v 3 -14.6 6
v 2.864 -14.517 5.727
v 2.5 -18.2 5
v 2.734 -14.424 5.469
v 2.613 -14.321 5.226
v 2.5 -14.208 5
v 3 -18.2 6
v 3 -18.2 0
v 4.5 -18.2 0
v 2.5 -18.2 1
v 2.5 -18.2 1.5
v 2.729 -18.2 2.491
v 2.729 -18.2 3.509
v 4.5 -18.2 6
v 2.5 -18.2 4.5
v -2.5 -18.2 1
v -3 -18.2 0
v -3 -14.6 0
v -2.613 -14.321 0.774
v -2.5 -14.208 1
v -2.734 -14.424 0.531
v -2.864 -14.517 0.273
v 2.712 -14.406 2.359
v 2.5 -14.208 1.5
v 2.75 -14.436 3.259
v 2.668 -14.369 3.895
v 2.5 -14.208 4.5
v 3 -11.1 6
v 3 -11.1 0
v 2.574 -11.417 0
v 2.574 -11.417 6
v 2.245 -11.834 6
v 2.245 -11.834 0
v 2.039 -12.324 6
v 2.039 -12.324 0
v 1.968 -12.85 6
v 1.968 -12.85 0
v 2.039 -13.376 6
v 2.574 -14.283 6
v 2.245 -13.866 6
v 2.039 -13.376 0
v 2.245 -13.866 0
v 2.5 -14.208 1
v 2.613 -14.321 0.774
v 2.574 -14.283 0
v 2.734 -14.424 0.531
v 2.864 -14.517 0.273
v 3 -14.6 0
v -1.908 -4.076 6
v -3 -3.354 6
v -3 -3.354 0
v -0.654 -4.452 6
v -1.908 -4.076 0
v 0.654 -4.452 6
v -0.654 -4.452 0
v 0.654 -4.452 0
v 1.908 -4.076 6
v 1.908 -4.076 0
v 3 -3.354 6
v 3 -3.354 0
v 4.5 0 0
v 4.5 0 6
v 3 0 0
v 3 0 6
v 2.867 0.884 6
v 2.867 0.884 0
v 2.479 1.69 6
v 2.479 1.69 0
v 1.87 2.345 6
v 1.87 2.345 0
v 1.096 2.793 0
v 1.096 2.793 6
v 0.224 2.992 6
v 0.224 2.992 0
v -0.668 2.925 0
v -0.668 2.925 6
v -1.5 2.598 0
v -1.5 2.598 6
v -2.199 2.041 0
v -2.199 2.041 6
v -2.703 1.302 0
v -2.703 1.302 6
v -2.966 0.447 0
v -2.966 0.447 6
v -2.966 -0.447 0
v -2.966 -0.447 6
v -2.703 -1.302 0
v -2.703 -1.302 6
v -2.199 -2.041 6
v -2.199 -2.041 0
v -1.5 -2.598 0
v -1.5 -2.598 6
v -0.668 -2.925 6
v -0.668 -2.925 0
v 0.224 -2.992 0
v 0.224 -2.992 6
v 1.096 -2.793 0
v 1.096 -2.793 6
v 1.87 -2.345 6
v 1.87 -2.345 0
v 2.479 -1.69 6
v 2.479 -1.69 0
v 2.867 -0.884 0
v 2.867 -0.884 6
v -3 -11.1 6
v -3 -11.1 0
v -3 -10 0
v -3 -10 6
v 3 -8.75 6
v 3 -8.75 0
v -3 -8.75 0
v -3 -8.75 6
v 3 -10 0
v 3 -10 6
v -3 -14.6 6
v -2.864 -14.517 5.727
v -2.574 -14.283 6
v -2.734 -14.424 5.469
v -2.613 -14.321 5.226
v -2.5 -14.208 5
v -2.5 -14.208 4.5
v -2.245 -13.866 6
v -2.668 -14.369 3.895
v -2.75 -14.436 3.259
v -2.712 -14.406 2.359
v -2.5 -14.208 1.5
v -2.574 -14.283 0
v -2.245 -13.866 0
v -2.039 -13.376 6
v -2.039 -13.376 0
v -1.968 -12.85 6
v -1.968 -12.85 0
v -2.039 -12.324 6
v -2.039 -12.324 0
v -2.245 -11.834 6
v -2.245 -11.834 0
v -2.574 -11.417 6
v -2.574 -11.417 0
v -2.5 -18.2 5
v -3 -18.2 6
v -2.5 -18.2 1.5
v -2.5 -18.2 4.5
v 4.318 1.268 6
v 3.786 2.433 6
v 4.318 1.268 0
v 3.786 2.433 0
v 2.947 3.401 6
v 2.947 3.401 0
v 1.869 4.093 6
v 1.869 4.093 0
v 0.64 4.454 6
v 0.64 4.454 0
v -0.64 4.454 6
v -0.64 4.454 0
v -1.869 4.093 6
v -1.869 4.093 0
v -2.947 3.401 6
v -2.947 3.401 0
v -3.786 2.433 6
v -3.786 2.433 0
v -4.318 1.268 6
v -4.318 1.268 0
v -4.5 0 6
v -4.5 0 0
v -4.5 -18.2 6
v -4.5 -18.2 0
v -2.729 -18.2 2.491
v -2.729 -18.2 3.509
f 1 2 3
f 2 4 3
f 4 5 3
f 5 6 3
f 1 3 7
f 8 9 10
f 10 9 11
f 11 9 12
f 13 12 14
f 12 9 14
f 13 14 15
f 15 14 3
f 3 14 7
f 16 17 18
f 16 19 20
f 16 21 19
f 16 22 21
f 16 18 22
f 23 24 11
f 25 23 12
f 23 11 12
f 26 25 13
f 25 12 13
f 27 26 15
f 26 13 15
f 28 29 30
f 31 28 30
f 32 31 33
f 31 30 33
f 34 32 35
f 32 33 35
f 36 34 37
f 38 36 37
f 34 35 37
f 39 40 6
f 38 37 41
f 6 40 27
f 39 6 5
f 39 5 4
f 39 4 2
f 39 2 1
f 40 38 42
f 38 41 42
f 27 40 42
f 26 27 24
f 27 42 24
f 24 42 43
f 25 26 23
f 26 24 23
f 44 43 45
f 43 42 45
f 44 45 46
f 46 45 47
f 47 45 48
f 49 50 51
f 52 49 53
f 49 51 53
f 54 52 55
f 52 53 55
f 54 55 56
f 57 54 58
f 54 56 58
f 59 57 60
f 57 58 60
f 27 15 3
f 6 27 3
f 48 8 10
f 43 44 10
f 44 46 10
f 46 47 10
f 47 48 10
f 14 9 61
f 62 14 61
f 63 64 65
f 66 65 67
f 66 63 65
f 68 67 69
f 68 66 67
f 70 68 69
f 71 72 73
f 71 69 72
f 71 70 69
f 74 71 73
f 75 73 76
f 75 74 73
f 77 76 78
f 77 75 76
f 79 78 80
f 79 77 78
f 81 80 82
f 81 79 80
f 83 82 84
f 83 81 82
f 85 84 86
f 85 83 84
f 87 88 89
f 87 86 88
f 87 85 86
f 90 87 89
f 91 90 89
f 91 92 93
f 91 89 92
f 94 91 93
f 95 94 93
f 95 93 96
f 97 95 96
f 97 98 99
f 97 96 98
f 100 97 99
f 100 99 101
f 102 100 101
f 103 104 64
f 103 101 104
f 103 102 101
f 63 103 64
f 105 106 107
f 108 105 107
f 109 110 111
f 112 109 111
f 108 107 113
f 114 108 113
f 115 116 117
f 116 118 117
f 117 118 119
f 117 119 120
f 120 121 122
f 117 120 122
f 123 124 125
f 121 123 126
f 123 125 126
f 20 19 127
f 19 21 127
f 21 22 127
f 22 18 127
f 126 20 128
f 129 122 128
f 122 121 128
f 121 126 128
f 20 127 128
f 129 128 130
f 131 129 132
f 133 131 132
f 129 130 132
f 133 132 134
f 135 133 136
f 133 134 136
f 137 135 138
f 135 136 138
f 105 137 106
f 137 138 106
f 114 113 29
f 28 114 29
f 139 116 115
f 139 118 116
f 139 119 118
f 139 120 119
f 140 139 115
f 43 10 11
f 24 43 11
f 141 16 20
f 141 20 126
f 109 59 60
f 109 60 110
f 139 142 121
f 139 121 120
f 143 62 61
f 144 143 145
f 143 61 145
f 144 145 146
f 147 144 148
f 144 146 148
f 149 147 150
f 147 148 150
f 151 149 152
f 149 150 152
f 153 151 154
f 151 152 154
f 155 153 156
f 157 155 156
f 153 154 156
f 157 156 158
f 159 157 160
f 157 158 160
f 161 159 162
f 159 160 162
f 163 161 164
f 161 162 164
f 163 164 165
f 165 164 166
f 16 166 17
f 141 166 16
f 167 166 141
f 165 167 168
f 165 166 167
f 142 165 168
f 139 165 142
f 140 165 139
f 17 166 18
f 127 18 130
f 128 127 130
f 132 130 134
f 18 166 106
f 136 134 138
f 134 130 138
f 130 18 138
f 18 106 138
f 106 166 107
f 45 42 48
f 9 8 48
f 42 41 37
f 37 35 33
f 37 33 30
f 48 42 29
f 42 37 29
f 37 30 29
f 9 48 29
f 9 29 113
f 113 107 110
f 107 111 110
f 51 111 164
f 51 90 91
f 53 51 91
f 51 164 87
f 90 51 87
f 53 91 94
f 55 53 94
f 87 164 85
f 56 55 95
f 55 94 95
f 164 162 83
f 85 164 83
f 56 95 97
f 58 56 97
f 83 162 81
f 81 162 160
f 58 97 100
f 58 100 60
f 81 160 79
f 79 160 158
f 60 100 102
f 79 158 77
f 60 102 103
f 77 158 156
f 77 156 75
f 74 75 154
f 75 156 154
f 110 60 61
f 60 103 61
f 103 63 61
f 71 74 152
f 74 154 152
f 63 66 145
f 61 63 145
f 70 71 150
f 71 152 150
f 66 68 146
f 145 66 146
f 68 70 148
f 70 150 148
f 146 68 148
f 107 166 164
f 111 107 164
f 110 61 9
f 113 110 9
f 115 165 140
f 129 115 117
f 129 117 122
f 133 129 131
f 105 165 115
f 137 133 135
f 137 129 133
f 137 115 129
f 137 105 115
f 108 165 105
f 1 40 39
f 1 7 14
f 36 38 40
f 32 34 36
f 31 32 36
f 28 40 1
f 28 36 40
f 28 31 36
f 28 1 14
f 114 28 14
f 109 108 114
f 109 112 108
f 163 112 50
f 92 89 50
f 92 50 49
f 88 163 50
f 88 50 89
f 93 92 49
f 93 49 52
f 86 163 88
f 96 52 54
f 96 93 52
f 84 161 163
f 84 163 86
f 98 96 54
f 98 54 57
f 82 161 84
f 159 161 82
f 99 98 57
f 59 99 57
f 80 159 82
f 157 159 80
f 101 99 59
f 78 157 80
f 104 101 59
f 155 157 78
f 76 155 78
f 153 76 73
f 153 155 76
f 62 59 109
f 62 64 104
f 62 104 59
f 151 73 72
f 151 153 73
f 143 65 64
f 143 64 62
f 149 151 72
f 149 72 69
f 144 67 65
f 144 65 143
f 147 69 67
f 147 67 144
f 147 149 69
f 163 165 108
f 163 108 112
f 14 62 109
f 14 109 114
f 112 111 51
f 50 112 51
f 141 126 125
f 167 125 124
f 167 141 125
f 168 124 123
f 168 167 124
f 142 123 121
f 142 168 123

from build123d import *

# Parameters (mm, degrees)
EXTRUDE_1_DEPTH     = 6
SKETCH_2_R          = 3
CUT_EXTRUDE_1_DEPTH = 7
EXTRUDE_2_REACH     = 24.7


with BuildPart() as part:
    # 草图1 → 凸台-拉伸1 (new body)
    with BuildSketch(Plane.XY):
        with BuildLine():
            Line((-4.5, 0), (-4.5, -18.2))
            Line((-4.5, -18.2), (-3, -18.2))
            Line((-3, -18.2), (-3, -14.6))
            ThreePointArc((-3, -14.6), (-1.968245837, -12.85), (-3, -11.1))
            Line((-3, -11.1), (-3, -10))
            Line((-3, -10), (3, -10))
            Line((3, -10), (3, -11.1))
            ThreePointArc((3, -11.1), (1.968245837, -12.85), (3, -14.6))
            Line((3, -14.6), (3, -18.2))
            Line((3, -18.2), (4.5, -18.2))
            Line((4.5, -18.2), (4.5, 0))
            ThreePointArc((4.5, 0), (0, 4.5), (-4.5, 0))
        make_face()
    extrude(amount=EXTRUDE_1_DEPTH)

    # 草图2 → 切除-拉伸1 (cut, through all)
    with BuildSketch(Plane.XY):
        Circle(SKETCH_2_R)
        with BuildLine():
            Line((-3, -8.75), (-3, -3.354101966))
            ThreePointArc((-3, -3.354101966), (0, -4.5), (3, -3.354101966))
            Line((3, -3.354101966), (3, -8.75))
            Line((3, -8.75), (-3, -8.75))
        make_face()
    extrude(amount=CUT_EXTRUDE_1_DEPTH, mode=Mode.SUBTRACT)

    # 草图3 → 凸台-拉伸2 (add, up to next)
    with BuildSketch(Plane.XZ.offset(18.2), mode=Mode.PRIVATE) as extrude_2_sk1:
        with BuildLine():
            Line((-3, 6), (-3, 0))
            Line((-3, 0), (-2.5, 1))
            Line((-2.5, 1), (-2.5, 1.5))
            ThreePointArc((-2.5, 1.5), (-2.757359313, 3), (-2.5, 4.5))
            Line((-2.5, 4.5), (-2.5, 5))
            Line((-2.5, 5), (-3, 6))
        make_face()
    extrude_2_tool1 = extrude(extrude_2_sk1.sketch, amount=-EXTRUDE_2_REACH, mode=Mode.PRIVATE) - part.part
    add(extrude_2_tool1.solids().sort_by_distance((-2.809362, -18.2, 3))[0])
    # 草图3 → 凸台-拉伸2 (add, up to next)
    with BuildSketch(Plane.XZ.offset(18.2), mode=Mode.PRIVATE) as extrude_2_sk2:
        with BuildLine():
            Line((3, 0), (2.5, 1))
            Line((2.5, 1), (2.5, 1.5))
            ThreePointArc((2.5, 1.5), (2.757359313, 3), (2.5, 4.5))
            Line((2.5, 4.5), (2.5, 5))
            Line((2.5, 5), (3, 6))
            Line((3, 6), (3, 0))
        make_face()
    extrude_2_tool2 = extrude(extrude_2_sk2.sketch, amount=-EXTRUDE_2_REACH, mode=Mode.PRIVATE) - part.part
    add(extrude_2_tool2.solids().sort_by_distance((2.809362, -18.2, 3))[0])


solid = part.part
